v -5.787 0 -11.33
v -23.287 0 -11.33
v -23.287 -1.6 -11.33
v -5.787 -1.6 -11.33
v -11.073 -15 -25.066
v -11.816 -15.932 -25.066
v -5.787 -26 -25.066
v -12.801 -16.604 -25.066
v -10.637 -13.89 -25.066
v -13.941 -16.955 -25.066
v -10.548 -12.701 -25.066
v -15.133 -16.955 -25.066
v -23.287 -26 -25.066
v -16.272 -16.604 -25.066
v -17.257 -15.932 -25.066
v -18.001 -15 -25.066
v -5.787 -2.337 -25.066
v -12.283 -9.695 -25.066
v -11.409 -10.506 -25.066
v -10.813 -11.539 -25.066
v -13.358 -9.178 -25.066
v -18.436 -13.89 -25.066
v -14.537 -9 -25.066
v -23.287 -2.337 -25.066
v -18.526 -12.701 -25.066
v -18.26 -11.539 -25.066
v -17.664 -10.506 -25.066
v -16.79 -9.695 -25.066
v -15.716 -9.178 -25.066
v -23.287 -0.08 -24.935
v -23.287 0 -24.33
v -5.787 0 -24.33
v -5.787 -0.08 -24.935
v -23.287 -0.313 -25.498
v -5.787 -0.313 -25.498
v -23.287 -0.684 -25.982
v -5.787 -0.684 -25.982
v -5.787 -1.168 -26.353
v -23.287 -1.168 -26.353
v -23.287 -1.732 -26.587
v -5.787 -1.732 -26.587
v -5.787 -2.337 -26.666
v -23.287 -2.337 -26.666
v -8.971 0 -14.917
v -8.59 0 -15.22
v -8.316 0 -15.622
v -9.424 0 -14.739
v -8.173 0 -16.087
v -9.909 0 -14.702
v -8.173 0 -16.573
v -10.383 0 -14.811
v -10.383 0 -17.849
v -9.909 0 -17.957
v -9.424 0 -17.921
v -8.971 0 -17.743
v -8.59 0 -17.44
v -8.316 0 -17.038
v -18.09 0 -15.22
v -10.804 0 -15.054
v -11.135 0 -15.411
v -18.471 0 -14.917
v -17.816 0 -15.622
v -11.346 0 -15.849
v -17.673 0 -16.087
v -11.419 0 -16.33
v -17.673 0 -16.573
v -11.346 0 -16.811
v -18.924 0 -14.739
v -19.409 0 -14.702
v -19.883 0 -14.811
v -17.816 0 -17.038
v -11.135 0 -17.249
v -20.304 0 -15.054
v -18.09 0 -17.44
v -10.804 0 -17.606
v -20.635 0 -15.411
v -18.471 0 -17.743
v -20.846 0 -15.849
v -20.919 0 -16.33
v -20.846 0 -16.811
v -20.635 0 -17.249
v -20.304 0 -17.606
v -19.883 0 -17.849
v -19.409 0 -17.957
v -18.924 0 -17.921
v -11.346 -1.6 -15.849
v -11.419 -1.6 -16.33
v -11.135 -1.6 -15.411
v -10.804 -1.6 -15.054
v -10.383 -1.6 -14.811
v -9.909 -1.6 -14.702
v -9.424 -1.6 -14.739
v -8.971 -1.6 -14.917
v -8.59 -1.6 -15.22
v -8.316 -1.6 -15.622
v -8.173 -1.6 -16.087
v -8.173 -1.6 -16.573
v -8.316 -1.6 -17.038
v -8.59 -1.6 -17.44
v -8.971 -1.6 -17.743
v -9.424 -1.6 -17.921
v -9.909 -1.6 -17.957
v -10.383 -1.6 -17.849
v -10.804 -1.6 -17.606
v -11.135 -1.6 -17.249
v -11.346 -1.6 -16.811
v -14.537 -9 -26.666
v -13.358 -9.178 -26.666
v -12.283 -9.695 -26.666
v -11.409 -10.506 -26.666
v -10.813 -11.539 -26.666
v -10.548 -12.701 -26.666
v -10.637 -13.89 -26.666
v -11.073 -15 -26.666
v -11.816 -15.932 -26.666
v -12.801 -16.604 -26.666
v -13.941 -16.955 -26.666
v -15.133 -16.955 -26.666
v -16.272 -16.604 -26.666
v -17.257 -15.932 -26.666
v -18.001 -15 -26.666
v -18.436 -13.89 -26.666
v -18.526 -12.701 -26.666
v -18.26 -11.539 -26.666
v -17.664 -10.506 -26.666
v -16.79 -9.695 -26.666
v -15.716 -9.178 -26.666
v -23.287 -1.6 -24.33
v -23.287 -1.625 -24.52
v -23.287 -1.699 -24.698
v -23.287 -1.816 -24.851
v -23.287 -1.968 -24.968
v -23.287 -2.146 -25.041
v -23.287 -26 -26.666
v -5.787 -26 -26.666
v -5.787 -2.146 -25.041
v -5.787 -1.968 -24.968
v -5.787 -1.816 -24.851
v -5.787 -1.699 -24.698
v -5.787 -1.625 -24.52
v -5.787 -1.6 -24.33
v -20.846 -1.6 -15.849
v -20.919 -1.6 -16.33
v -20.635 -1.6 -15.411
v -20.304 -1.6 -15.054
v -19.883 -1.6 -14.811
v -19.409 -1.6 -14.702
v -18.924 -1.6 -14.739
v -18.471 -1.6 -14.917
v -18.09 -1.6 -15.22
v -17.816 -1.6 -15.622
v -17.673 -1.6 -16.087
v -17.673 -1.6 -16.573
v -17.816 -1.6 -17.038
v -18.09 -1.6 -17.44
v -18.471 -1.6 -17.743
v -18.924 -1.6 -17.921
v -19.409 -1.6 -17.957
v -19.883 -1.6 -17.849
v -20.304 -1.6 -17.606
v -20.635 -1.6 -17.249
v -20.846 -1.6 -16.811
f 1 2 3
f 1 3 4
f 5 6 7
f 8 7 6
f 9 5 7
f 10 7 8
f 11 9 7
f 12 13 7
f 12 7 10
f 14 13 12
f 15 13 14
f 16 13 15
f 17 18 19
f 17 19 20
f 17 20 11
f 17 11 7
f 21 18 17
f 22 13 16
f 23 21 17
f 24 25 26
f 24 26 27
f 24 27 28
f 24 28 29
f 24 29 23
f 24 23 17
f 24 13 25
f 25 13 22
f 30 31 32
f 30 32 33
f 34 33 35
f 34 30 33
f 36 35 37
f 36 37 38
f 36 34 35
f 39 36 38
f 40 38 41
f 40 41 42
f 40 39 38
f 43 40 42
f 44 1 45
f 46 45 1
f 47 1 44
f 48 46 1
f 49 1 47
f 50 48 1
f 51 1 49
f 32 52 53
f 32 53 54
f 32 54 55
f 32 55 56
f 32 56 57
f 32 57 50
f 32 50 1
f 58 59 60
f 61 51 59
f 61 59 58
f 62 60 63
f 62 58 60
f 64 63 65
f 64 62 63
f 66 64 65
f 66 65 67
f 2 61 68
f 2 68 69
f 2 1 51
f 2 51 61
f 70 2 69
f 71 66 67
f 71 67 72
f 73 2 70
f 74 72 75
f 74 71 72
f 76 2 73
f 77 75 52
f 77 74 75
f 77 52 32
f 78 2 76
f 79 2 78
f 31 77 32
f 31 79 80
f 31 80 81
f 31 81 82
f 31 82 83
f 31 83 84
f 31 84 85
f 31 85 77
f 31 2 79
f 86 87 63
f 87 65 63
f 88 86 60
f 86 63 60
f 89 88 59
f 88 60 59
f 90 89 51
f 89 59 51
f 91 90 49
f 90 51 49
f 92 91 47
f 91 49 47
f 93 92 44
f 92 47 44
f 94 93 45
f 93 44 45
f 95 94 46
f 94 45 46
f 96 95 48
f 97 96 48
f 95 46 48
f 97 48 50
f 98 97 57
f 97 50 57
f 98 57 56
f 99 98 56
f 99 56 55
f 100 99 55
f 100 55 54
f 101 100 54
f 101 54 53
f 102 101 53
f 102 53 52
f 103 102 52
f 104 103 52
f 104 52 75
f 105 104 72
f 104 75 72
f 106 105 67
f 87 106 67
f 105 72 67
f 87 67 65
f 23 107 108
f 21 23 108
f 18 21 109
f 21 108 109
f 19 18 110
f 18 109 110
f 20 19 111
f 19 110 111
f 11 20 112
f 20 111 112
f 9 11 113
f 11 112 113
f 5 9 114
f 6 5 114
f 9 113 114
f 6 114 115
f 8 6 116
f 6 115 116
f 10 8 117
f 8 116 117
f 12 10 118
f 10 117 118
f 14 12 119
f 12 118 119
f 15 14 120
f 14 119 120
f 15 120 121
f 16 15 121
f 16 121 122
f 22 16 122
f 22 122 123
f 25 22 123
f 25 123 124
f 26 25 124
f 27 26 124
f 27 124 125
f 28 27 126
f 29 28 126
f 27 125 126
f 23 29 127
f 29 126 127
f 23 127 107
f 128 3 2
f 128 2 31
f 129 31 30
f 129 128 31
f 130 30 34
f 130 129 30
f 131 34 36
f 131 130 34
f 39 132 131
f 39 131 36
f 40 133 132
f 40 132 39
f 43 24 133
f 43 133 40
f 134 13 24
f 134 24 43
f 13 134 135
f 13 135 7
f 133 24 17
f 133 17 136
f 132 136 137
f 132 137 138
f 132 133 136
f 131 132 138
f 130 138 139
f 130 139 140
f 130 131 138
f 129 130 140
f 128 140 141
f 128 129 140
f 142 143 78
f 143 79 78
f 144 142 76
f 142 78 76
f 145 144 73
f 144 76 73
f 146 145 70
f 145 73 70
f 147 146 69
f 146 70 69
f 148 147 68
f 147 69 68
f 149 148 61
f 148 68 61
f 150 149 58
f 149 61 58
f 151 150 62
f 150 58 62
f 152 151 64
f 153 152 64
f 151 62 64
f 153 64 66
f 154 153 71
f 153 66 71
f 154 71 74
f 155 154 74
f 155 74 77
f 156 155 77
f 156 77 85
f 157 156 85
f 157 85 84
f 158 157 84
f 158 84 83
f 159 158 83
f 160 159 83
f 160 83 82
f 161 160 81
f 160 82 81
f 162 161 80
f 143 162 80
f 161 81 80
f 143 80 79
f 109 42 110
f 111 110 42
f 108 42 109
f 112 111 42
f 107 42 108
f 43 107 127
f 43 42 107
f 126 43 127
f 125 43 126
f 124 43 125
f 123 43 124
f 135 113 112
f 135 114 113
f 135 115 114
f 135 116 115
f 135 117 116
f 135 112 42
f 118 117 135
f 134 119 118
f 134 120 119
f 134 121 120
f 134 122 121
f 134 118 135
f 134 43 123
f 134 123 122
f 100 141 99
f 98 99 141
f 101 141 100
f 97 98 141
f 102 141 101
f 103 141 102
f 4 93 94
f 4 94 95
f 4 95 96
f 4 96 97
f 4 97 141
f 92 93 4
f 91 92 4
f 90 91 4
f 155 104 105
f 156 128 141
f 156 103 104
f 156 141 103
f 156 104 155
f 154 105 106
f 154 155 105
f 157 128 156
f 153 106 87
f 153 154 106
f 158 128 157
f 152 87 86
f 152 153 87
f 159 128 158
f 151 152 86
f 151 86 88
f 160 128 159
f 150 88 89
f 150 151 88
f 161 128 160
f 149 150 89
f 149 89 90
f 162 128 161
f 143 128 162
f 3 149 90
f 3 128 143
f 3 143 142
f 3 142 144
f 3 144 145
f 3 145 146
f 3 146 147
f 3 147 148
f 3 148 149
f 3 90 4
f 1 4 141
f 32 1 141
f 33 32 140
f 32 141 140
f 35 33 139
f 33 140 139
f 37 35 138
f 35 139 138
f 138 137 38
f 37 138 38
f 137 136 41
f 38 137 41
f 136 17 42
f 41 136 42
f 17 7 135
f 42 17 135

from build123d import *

# Parameters (mm, degrees)
SKETCH1_W                 = 17.5
SKETCH1_H                 = 10
BASE_FLANGE1_DEPTH        = 1.6
F_4_CLEARANCE_HOLE1_D     = 3.2639
F_4_CLEARANCE_HOLE1_DEPTH = 1.6
F_4_CLEARANCE_HOLE1_TIP   = 0.980574487
EDGE_FLANGE1_DEPTH        = 17.5
SKETCH20_R                = 4
CUT_EXTRUDE1_DEPTH        = 1.6


# Sheet-metal steps are written as plain solids
with BuildPart() as part:
    # Sketch1 → Base-Flange1 (new body)
    with BuildSketch(Plane(origin=(0, 0, 0), x_dir=(1, 0, 0), z_dir=(0, 1, 0))):
        with Locations((-14.536713287, 16.32983683)):
            Rectangle(SKETCH1_W, SKETCH1_H)
    extrude(amount=-BASE_FLANGE1_DEPTH)

    # #4 Clearance Hole1
    with Locations(Plane.XZ.offset(1.6)):
        with Locations((-9.786713287, -16.32983683), (-19.286713287, -16.32983683)):
            Hole(F_4_CLEARANCE_HOLE1_D / 2, depth=F_4_CLEARANCE_HOLE1_DEPTH)
            with Locations((0, 0, -(F_4_CLEARANCE_HOLE1_DEPTH + F_4_CLEARANCE_HOLE1_TIP / 2))):  # 118° drill point
                Cone(0, F_4_CLEARANCE_HOLE1_D / 2, F_4_CLEARANCE_HOLE1_TIP, mode=Mode.SUBTRACT)

    # Edge-Flange1 section (across the edge) → Edge-Flange1 (add)
    with BuildSketch(Plane(origin=(-23.286713287, -1.6, -25.06643683), x_dir=(0, 0, 1), z_dir=(1, 0, 0))):
        with BuildLine():
            Line((-1.6, 0.7366), (-1.6, 24.4))
            Line((-1.6, 24.4), (0, 24.4))
            Line((0, 24.4), (0, 0.7366))
            ThreePointArc((0, 0.7366), (0.215745145, 0.215745145), (0.7366, 0))
            Line((0.7366, 0), (3.7366, 0))
            Line((3.7366, 0), (3.7366, -1.6))
            Line((3.7366, -1.6), (0.7366, -1.6))
            ThreePointArc((0.7366, -1.6), (-0.915625705, -0.915625705), (-1.6, 0.7366))
        make_face()
    extrude(amount=EDGE_FLANGE1_DEPTH)

    # Sketch20 → Cut-Extrude1 (cut)
    with BuildSketch(Plane(origin=(0, 0, -26.66643683), x_dir=(-1, 0, 0), z_dir=(0, 0, -1))):
        with Locations(Location((14.536713287, -13, 0), (0, 0, 90))):
            Circle(SKETCH20_R)
    extrude(amount=-CUT_EXTRUDE1_DEPTH, mode=Mode.SUBTRACT)


solid = part.part
